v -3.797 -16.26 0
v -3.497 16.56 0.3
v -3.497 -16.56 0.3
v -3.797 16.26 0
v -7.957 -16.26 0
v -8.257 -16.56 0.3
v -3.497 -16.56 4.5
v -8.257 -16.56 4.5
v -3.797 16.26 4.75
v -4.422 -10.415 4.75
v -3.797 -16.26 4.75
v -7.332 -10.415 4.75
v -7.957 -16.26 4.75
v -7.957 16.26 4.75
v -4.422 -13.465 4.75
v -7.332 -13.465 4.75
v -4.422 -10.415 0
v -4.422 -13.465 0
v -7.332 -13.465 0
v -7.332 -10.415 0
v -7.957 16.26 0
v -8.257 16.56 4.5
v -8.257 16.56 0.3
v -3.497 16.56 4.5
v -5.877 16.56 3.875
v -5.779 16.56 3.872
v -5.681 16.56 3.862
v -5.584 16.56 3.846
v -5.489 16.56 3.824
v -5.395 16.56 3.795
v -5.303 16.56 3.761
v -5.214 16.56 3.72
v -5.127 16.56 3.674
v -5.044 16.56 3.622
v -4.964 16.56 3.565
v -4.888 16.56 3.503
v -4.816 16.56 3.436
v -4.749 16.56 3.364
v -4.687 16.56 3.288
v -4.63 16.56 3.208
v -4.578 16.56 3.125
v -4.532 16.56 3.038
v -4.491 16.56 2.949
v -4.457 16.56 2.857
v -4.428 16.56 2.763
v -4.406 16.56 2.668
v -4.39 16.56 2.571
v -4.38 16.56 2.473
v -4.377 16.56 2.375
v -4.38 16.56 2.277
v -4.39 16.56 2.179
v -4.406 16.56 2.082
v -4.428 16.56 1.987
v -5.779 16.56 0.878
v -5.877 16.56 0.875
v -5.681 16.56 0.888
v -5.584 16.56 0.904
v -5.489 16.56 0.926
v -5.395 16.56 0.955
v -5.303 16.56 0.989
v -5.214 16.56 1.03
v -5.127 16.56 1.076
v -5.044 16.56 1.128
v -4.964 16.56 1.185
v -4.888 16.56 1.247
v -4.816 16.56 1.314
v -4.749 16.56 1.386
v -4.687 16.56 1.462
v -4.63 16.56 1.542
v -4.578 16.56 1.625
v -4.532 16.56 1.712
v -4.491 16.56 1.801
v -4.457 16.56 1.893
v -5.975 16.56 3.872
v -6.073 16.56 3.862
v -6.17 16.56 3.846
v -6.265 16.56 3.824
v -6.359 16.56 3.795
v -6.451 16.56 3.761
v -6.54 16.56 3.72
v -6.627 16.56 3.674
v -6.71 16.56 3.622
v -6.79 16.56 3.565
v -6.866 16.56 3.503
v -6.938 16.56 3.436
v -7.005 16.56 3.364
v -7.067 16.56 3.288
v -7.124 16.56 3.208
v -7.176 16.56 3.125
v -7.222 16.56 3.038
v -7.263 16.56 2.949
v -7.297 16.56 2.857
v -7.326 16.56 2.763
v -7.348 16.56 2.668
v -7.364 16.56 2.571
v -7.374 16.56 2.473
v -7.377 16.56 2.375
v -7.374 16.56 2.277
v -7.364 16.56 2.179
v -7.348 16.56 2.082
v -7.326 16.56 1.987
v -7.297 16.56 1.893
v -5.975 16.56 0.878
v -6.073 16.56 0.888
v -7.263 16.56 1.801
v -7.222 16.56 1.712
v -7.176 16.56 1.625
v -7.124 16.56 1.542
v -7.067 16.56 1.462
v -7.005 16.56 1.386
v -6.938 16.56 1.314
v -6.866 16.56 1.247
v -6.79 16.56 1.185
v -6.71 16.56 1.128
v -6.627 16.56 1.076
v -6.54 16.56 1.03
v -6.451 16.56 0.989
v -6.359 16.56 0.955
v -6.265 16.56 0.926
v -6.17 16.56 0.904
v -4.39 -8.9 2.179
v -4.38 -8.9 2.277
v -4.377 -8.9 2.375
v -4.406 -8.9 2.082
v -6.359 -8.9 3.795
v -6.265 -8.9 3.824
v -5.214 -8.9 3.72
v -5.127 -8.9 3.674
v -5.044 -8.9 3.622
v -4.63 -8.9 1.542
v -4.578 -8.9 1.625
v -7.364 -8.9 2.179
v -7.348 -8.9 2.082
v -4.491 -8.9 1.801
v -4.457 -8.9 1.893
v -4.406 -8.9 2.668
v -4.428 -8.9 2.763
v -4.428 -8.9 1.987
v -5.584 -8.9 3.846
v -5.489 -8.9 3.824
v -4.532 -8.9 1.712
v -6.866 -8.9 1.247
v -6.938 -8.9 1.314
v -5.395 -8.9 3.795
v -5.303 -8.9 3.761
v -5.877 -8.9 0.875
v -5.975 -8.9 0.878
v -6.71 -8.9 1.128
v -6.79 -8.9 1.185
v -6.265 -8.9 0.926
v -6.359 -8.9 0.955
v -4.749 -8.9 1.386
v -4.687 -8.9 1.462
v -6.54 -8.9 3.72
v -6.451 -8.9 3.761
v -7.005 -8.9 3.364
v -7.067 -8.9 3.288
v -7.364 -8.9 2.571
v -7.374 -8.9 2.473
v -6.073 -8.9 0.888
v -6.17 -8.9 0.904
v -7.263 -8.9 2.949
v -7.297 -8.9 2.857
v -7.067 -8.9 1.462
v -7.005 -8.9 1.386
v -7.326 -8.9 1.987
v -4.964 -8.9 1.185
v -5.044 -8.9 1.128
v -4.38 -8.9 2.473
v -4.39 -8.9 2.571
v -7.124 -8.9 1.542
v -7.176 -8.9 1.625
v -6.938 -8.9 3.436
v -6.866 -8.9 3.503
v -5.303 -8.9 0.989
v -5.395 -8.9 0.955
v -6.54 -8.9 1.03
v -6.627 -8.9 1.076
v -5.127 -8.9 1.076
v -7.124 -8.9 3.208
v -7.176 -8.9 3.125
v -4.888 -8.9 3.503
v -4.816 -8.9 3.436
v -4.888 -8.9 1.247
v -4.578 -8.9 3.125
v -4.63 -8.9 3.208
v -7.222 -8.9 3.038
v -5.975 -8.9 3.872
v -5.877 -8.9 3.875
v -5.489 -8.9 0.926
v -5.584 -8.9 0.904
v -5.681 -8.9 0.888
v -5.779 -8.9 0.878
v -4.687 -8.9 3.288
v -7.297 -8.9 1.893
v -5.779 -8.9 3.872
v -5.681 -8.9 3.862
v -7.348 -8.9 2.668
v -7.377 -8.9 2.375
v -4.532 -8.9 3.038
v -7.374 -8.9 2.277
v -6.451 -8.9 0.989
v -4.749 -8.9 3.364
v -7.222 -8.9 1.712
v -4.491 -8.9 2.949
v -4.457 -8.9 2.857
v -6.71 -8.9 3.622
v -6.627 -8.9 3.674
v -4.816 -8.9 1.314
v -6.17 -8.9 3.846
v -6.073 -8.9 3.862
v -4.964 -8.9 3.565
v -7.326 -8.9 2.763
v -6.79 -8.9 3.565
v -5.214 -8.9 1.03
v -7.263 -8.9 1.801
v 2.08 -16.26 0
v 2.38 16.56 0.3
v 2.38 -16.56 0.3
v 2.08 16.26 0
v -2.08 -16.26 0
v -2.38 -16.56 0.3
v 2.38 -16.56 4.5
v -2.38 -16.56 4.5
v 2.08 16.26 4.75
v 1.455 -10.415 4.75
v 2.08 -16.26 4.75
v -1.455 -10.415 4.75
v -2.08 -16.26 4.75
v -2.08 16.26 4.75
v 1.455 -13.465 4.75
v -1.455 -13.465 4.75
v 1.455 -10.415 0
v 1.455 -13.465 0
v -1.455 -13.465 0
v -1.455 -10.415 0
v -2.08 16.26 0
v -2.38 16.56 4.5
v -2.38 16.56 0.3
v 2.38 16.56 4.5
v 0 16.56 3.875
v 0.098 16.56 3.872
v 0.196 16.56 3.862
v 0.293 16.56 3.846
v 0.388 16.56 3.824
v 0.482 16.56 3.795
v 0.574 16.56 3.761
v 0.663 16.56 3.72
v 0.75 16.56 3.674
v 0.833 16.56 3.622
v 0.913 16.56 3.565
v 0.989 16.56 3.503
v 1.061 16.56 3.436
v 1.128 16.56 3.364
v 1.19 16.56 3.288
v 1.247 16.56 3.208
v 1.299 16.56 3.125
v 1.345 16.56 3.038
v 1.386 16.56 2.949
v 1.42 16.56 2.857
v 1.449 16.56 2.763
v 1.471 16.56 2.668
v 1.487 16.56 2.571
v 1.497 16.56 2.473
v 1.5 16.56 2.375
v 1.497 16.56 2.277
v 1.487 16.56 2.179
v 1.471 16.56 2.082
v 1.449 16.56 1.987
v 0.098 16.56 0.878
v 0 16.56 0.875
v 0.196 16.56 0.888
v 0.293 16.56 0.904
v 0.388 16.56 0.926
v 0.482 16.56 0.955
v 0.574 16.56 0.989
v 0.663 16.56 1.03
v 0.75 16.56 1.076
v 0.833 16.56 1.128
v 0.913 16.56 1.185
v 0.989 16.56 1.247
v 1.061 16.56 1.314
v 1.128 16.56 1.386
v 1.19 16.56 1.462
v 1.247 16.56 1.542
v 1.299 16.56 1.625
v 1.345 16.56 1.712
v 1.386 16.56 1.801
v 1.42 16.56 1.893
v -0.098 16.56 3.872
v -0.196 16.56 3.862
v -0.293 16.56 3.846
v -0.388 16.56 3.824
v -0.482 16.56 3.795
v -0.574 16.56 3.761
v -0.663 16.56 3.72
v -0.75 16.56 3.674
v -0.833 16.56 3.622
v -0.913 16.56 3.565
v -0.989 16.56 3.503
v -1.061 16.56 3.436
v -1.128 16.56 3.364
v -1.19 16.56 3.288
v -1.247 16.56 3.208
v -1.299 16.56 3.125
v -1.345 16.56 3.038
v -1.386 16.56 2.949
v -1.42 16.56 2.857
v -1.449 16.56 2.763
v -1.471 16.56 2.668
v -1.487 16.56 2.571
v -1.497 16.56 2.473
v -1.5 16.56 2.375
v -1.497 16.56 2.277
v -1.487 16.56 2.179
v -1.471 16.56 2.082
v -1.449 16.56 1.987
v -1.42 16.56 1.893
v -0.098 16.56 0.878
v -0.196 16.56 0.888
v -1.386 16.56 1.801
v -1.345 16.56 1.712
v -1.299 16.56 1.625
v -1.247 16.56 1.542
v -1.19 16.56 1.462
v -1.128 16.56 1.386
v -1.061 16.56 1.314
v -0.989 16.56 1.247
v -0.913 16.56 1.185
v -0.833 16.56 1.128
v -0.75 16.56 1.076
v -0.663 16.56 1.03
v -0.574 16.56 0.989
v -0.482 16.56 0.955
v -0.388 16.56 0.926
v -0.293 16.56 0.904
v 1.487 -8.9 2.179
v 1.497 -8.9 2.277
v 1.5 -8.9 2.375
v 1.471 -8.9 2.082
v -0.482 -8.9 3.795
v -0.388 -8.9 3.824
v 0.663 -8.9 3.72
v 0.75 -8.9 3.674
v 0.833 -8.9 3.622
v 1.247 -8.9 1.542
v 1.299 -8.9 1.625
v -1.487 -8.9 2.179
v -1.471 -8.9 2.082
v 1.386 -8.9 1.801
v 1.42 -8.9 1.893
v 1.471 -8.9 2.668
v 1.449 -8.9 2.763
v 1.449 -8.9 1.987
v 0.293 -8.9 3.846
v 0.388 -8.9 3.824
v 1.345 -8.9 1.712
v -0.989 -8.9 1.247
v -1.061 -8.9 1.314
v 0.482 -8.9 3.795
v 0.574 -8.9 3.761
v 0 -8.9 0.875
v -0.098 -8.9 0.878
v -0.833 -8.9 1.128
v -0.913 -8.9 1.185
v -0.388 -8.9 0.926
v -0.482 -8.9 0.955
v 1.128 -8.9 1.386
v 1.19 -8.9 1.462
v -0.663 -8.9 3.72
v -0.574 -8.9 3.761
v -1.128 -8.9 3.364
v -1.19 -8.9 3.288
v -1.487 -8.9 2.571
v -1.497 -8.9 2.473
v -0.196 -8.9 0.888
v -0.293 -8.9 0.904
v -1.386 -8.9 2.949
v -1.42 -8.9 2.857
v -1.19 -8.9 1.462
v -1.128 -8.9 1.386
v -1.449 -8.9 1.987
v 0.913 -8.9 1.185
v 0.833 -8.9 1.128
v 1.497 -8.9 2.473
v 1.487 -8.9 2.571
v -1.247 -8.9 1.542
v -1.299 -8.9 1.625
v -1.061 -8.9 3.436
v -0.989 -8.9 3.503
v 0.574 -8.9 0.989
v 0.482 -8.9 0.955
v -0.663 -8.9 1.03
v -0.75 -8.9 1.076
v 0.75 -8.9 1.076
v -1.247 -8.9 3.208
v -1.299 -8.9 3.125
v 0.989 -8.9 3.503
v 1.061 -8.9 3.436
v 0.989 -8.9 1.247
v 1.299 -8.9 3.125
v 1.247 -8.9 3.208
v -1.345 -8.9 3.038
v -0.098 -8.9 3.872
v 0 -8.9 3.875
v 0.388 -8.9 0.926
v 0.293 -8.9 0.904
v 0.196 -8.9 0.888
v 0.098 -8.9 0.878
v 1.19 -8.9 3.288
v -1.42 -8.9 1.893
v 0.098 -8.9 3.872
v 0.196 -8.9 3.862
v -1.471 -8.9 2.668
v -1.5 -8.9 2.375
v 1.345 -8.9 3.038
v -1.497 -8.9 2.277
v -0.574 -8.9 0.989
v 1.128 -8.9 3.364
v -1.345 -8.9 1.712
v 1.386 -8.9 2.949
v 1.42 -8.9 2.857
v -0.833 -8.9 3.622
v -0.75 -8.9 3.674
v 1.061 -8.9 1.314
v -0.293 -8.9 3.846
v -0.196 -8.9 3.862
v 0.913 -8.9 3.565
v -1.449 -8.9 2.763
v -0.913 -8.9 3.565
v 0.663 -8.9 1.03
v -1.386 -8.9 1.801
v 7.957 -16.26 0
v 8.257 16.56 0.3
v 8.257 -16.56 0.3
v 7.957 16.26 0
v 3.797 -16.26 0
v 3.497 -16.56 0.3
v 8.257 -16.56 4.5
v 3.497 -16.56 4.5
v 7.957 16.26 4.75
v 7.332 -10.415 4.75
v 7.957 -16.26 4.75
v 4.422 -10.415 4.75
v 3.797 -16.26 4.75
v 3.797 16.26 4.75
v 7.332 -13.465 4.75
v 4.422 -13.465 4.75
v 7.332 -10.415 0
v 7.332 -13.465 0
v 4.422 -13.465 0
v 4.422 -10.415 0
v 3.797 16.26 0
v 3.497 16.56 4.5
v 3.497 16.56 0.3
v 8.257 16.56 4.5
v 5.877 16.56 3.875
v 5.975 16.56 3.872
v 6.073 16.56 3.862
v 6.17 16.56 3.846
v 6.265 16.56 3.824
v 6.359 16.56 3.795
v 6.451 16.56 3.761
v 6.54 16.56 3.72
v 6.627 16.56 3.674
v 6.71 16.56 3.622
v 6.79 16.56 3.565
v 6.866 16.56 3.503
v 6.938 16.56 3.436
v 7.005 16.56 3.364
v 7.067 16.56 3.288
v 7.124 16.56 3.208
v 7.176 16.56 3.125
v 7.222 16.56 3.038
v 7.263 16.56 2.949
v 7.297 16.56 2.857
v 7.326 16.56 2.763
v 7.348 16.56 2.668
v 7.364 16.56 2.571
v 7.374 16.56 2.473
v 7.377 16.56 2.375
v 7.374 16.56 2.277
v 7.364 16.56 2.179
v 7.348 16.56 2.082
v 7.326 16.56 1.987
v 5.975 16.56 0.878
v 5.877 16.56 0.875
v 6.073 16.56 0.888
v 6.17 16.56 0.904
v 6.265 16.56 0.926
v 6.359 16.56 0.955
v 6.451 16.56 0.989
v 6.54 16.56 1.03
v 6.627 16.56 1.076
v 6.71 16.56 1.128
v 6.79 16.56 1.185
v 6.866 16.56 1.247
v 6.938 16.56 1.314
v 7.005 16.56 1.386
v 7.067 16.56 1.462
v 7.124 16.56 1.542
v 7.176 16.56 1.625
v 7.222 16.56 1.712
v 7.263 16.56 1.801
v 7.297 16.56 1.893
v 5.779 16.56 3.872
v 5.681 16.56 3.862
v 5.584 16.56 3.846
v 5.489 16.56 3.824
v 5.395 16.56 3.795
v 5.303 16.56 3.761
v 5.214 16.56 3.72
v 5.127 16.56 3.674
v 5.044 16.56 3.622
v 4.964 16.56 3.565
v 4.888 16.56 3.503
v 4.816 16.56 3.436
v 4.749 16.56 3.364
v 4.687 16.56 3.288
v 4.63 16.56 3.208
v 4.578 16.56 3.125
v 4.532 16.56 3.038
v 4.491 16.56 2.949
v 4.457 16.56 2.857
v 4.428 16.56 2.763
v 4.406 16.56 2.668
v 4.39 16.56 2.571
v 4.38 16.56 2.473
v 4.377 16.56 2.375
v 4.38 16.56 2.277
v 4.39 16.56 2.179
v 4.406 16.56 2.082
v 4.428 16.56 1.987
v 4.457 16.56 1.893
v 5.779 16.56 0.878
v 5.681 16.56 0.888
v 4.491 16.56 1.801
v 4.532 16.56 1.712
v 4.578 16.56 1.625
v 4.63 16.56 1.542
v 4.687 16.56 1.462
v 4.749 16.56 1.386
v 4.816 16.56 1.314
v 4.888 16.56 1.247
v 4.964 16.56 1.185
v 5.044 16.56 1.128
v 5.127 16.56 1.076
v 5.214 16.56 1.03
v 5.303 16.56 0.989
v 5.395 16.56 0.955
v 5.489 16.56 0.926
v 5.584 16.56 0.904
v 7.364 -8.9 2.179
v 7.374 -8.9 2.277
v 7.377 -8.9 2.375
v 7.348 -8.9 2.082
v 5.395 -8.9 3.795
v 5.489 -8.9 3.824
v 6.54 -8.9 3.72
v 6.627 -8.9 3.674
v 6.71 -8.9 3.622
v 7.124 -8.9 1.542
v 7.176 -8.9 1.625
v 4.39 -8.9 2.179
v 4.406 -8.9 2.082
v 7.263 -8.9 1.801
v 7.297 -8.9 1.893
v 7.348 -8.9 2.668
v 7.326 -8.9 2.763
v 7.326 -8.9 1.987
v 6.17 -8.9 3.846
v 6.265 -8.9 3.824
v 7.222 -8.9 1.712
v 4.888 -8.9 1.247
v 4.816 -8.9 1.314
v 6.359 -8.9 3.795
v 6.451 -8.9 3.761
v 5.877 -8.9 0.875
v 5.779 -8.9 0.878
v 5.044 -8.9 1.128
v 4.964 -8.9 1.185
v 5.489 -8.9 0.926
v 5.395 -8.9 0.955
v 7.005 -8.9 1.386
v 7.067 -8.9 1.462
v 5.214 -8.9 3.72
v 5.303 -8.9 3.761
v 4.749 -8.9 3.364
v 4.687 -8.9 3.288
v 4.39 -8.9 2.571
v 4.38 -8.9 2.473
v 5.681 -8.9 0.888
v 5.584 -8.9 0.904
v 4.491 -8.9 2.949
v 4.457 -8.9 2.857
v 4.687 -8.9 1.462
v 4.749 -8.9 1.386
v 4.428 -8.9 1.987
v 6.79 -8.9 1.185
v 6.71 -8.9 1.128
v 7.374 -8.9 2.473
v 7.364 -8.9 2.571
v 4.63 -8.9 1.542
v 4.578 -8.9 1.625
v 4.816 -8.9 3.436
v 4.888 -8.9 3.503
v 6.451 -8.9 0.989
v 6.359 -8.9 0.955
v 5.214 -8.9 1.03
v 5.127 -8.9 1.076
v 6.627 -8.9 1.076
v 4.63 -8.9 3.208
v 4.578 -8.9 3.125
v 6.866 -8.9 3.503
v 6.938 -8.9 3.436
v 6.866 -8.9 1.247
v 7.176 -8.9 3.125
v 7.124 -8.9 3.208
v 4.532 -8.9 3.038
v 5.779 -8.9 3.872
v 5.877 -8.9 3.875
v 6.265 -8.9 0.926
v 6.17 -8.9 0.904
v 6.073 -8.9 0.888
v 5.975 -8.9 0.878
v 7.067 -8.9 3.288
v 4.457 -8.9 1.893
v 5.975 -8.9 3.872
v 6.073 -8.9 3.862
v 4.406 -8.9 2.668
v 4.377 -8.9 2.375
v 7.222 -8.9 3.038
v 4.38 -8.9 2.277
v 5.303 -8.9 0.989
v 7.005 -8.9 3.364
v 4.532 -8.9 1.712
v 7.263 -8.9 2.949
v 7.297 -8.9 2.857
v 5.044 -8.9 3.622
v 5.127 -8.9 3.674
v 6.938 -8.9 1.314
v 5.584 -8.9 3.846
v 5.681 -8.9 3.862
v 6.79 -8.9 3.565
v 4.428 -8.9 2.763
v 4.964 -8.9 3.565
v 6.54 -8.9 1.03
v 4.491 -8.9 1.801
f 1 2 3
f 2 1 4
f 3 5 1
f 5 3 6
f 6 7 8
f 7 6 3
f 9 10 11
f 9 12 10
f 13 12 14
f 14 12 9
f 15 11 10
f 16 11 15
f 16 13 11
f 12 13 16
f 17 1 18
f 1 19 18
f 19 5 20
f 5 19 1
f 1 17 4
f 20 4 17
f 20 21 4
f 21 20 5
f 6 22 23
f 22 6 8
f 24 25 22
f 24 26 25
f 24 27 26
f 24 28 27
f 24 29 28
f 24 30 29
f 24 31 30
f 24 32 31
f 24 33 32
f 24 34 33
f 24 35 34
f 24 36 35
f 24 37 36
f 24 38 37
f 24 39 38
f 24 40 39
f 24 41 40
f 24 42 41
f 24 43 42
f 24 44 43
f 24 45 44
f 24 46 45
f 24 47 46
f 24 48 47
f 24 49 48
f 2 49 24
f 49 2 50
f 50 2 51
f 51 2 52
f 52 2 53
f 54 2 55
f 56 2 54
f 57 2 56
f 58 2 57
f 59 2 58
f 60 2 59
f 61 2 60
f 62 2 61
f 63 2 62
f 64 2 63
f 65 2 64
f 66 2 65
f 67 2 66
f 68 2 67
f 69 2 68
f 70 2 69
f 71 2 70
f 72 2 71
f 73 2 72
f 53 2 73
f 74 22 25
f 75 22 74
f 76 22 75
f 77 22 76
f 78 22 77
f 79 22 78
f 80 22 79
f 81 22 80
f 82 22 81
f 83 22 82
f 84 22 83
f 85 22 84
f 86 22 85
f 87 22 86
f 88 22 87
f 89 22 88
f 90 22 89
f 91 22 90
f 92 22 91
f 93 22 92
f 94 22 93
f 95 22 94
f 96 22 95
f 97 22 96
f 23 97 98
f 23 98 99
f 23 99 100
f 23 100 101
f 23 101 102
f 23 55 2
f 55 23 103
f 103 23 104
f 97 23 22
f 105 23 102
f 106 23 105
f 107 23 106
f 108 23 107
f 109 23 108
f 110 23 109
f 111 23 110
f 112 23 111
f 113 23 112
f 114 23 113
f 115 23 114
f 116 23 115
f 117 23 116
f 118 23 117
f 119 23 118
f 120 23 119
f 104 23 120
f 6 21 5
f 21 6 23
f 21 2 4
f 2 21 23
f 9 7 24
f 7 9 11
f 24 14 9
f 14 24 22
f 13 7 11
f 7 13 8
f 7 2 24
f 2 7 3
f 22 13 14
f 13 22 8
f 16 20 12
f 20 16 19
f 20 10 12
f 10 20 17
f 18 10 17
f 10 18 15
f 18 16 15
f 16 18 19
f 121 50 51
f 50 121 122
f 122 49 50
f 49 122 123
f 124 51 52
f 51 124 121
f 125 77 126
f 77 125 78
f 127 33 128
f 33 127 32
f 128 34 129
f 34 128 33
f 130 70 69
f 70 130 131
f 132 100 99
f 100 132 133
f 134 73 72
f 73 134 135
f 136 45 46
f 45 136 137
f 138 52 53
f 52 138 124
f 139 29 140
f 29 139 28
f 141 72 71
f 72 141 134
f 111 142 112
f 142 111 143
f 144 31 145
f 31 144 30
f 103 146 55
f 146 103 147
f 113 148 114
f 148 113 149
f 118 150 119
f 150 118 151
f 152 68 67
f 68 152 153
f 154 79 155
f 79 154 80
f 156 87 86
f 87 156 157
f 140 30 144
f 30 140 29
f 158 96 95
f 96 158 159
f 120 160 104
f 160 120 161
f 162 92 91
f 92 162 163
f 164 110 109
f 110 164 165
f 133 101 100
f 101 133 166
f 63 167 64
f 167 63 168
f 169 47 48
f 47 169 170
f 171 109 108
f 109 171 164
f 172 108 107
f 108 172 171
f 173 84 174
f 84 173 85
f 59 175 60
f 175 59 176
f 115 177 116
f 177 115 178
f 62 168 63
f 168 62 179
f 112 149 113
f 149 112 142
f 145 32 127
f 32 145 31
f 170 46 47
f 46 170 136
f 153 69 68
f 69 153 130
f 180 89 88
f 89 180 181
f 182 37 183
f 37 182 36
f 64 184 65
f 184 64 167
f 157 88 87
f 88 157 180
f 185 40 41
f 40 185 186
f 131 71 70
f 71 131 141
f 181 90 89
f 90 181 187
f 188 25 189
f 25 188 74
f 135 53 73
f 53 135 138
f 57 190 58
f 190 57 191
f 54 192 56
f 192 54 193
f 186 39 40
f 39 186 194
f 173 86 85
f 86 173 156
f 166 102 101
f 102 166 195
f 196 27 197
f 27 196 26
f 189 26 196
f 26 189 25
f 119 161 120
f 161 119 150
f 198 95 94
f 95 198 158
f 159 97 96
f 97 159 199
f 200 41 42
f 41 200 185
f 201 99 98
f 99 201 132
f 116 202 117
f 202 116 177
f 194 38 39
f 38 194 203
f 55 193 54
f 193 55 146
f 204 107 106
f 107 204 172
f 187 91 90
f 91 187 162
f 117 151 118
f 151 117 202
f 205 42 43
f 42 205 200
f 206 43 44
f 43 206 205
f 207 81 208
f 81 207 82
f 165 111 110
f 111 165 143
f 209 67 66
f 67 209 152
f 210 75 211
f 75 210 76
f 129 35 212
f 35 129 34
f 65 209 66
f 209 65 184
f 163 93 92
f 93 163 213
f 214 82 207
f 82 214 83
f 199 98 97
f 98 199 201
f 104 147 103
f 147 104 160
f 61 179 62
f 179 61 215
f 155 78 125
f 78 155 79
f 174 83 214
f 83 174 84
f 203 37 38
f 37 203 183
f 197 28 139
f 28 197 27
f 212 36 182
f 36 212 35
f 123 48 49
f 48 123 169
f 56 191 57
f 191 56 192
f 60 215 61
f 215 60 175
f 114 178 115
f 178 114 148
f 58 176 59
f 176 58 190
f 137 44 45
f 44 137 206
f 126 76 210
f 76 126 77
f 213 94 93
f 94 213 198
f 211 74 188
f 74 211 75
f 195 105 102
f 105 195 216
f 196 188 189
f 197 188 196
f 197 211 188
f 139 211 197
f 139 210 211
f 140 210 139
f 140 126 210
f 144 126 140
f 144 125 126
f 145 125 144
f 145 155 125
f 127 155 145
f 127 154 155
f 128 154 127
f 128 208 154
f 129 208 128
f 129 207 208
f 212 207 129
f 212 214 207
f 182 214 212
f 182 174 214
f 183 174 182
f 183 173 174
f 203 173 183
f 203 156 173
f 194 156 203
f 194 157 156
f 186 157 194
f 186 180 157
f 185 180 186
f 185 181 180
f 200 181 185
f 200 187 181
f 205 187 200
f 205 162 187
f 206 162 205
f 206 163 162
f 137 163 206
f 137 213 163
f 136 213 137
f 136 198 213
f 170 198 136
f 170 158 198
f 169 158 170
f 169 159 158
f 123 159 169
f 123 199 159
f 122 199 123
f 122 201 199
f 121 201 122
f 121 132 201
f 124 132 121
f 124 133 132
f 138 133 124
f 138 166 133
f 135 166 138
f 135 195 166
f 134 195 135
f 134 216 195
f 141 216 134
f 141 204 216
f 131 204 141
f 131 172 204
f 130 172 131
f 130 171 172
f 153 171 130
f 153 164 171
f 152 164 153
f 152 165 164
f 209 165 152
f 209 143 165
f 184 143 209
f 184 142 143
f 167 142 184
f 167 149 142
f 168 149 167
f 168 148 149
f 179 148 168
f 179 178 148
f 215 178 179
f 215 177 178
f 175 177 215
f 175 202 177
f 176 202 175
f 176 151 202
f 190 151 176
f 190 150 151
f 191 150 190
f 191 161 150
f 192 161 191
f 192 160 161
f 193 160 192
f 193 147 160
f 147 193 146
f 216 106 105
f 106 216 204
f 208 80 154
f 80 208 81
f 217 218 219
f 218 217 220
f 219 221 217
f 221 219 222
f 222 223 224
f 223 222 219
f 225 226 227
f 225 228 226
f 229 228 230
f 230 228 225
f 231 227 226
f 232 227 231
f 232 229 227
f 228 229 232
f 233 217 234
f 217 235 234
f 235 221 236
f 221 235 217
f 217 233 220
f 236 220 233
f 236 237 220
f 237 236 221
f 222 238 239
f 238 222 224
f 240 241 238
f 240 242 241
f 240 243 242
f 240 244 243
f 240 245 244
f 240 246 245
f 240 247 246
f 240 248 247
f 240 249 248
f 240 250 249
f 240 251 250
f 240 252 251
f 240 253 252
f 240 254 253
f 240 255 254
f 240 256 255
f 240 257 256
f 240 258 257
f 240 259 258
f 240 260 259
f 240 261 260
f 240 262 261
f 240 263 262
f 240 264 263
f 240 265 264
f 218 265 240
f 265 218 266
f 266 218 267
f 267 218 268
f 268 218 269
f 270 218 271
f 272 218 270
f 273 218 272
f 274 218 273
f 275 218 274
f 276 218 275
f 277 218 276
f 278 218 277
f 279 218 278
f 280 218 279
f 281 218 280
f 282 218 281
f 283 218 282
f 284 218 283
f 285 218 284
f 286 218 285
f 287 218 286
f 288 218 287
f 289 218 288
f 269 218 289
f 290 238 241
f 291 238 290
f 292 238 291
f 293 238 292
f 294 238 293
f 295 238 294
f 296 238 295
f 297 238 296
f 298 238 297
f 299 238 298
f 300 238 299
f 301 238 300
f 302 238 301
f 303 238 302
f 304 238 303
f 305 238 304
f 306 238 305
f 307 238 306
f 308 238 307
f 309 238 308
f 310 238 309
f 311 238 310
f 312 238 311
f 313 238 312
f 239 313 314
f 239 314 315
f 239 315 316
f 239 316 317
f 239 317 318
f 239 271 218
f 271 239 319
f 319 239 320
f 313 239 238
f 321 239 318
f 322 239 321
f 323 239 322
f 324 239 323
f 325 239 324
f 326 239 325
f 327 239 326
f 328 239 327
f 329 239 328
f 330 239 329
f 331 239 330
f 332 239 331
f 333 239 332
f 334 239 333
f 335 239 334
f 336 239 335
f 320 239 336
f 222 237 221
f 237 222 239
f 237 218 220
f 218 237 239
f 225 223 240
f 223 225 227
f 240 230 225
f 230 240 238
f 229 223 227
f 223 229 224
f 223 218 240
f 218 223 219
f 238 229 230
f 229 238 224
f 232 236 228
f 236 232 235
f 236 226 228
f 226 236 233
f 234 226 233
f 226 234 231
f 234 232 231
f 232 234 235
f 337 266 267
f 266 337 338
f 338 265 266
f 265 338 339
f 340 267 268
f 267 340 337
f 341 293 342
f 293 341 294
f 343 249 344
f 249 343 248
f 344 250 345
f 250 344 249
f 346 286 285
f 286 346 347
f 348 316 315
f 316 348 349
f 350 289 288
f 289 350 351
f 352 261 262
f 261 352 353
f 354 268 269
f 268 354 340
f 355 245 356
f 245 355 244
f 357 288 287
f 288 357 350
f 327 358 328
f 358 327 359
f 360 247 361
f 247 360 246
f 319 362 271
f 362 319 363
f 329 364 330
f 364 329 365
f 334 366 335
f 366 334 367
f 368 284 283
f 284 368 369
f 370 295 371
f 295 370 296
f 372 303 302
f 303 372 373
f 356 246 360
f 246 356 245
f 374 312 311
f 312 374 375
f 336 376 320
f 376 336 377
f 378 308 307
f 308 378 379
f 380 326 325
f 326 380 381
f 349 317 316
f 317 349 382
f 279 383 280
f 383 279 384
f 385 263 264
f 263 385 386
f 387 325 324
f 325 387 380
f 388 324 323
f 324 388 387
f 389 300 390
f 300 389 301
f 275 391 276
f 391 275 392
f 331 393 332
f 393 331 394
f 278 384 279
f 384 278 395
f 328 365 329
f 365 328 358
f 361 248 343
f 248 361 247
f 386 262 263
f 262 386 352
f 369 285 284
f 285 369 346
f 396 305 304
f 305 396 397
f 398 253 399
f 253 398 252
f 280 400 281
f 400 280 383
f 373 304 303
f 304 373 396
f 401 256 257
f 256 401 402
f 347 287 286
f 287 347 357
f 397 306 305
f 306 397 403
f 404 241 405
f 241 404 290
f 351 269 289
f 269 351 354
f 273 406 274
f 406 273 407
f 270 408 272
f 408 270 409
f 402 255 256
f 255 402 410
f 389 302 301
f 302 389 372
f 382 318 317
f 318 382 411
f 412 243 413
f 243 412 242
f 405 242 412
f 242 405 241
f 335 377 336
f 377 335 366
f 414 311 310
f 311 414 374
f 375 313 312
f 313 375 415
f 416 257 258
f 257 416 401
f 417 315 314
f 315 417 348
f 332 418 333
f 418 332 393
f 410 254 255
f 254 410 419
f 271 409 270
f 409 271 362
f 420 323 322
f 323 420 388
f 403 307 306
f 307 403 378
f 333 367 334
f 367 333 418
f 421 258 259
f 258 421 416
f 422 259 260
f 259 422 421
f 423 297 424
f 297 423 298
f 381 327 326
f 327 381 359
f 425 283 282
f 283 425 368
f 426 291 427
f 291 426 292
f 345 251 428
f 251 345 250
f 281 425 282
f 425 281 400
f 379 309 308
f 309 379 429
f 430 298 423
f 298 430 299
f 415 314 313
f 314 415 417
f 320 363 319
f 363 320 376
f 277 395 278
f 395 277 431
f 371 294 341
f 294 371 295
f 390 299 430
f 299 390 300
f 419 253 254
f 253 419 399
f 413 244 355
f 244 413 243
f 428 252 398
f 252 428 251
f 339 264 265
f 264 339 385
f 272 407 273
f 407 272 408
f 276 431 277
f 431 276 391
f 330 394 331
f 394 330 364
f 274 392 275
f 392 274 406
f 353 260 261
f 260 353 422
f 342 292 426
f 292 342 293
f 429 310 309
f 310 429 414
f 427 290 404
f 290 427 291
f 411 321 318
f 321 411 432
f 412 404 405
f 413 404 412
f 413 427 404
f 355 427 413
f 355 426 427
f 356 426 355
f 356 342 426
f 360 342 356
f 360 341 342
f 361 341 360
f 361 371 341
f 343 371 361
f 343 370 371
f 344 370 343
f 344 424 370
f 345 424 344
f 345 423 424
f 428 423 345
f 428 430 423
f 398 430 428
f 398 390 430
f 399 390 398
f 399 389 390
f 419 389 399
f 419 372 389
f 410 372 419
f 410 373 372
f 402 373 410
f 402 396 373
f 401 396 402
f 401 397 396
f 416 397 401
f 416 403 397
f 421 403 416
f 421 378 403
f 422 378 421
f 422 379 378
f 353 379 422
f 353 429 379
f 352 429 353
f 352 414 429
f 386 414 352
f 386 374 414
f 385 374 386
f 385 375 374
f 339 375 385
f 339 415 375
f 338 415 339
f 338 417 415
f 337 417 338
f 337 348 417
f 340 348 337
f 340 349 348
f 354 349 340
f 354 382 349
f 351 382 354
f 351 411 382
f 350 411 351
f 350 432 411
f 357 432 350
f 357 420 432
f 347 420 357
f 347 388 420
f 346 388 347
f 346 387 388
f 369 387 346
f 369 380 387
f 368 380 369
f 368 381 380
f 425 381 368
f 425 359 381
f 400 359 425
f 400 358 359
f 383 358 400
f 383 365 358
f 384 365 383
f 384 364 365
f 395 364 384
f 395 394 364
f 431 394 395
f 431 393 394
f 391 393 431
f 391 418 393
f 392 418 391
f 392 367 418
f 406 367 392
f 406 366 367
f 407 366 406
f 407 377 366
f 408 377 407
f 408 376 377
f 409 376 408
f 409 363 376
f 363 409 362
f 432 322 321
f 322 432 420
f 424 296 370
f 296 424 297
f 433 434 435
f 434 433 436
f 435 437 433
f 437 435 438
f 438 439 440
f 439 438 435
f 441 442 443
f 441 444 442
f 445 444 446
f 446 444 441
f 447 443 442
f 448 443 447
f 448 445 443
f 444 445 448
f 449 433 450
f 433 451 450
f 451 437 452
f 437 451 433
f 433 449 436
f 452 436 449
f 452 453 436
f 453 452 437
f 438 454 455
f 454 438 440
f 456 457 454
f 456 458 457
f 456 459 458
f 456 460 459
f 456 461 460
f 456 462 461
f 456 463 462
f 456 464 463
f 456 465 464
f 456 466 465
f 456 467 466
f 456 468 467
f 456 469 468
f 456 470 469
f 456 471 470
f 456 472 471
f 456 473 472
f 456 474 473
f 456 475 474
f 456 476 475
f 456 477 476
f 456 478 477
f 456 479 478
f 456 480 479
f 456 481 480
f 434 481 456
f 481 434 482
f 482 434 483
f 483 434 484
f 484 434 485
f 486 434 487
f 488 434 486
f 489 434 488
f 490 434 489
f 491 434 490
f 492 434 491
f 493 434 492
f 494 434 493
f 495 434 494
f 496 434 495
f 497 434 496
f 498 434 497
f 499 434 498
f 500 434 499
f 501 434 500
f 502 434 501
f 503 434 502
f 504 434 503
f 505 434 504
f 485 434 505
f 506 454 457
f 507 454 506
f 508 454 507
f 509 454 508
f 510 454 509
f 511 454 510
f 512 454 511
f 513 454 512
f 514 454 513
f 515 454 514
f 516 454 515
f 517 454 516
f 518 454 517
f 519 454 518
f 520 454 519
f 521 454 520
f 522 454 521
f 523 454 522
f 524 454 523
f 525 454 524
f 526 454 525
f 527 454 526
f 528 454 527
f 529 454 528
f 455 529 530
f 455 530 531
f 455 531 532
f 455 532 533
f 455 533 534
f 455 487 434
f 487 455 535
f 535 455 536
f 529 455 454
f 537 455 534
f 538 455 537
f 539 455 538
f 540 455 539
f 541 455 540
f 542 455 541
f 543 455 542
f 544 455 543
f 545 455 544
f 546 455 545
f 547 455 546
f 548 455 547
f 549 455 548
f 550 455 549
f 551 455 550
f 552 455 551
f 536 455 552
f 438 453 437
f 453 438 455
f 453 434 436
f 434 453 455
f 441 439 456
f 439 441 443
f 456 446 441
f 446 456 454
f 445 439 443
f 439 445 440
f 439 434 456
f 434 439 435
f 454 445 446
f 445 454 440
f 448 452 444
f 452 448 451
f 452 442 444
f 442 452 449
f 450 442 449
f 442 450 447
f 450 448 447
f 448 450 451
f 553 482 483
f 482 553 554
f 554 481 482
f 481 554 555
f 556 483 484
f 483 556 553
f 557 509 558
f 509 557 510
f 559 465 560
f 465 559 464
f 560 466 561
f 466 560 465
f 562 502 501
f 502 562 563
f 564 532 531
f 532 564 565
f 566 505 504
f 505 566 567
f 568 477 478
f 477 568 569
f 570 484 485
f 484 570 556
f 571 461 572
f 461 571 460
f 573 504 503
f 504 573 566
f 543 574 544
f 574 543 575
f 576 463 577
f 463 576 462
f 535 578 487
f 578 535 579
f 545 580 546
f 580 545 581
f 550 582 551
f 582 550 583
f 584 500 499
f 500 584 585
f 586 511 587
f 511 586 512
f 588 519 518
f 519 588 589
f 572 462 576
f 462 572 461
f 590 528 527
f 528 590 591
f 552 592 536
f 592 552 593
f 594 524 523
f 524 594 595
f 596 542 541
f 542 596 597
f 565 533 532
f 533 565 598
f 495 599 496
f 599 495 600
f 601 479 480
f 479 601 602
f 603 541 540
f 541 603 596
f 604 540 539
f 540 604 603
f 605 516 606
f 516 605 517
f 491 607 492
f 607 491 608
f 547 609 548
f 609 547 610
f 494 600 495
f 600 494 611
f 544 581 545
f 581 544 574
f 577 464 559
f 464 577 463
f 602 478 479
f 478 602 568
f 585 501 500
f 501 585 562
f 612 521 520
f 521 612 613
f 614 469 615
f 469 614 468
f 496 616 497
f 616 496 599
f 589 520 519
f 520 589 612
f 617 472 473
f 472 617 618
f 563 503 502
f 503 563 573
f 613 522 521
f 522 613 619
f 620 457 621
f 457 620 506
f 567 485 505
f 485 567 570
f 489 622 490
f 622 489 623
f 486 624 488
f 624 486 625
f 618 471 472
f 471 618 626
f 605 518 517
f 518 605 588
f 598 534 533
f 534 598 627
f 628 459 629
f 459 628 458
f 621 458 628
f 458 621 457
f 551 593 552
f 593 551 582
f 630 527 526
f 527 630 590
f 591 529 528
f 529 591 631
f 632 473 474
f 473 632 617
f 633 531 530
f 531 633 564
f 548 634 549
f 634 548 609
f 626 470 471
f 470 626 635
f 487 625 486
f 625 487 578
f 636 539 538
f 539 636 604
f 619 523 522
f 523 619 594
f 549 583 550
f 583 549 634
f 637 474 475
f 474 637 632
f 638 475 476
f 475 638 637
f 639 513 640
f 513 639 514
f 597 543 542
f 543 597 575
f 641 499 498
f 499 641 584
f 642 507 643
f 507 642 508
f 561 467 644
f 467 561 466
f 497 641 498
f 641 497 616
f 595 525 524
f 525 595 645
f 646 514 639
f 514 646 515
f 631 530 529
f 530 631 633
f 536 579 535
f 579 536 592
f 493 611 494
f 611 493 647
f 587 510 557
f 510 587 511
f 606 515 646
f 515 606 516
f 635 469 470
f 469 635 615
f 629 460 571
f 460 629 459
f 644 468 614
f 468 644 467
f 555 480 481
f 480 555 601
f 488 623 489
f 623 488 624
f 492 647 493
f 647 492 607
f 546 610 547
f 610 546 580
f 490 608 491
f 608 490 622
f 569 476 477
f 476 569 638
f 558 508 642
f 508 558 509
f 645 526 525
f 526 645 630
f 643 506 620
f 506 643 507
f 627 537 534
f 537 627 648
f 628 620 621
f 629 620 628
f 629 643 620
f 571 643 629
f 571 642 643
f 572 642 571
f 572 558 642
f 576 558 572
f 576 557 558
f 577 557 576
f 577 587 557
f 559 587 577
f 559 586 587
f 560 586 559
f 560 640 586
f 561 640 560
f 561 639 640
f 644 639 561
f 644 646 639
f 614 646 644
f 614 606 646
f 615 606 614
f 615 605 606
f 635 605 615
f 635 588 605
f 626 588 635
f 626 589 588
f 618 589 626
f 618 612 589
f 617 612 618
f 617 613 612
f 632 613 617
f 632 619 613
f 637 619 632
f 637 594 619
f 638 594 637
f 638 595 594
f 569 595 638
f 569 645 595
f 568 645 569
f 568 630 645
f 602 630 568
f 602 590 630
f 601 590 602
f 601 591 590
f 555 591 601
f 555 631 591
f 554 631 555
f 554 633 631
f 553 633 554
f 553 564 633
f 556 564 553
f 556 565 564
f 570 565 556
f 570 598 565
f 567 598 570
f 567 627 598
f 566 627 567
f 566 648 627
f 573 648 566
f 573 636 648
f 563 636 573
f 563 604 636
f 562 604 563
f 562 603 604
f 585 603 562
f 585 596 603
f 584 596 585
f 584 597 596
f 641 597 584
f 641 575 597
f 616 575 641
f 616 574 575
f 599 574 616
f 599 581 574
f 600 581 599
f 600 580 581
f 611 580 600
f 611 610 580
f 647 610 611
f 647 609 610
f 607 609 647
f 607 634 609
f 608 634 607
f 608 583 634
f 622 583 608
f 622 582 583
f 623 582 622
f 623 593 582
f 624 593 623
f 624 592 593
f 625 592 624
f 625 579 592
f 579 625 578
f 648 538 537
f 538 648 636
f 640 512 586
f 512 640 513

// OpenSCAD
// ============================================
// Project: Tensioner_Pins.stl reconstruction
// Description: Three identical tensioner pins - square rods with a square
//              strap hole near one end and a round bore along the length.
// Author: Claude Code + User
// ============================================
// Each pin: 4.76(X) x 33.12(Y) x 4.75(Z). 3 pins spaced 5.877mm in X.
// Centred at origin (X0 Y0), sitting on the build plate (Z0).

$fn = 96;
eps = 0.05;

// --- Pin body ---
pin_w   = 4.76;     // [mm] width  (X)
pin_l   = 33.12;    // [mm] length (Y)
pin_h   = 4.75;     // [mm] height (Z)
chamfer = 0.3;      // [mm] edge chamfer

// --- Square strap hole (through Z), near the head end ---
sq_x    = 2.91;     // [mm] X size
sq_y    = 3.05;     // [mm] Y size (mid-height; edges chamfered)
sq_yoff = -11.94;   // [mm] Y offset from pin centre

// --- Round bore (along Y, open at the far/+Y end) ---
bore_d  = 3.0;      // [mm]
bore_y0 = -8.90;    // [mm] bore start (Y offset from pin centre)

// --- Layout ---
n_pins   = 3.0;
pin_dx   = 5.877;   // [mm] X spacing

module rod() {
    c = chamfer;
    hull() {
        linear_extrude(eps) offset(delta = -c) square([pin_w, pin_l], center = true);
        translate([0, 0, c])        linear_extrude(eps) square([pin_w, pin_l], center = true);
        translate([0, 0, pin_h - c]) linear_extrude(eps) square([pin_w, pin_l], center = true);
        translate([0, 0, pin_h - eps]) linear_extrude(eps) offset(delta = -c) square([pin_w, pin_l], center = true);
    }
}

module pin() {
    cz = pin_h/2;
    difference() {
        // chamfered square rod (top/bottom edges), bottom on plate
        rod();
        // square strap hole through Z
        translate([0, sq_yoff, -eps])
            linear_extrude(pin_h + 2*eps)
                square([sq_x, sq_y], center = true);
        // round bore along Y (open at the +Y end)
        translate([0, bore_y0, cz])
            rotate([-90, 0, 0])
                cylinder(d = bore_d, h = pin_l/2 - bore_y0 + eps);
    }
}

// Assembly: 3 pins centred on origin
for (i = [0 : n_pins-1])
    translate([(i - (n_pins-1)/2) * pin_dx, 0, 0])
        pin();

echo(str("pin bbox ", pin_w, " x ", pin_l, " x ", pin_h));
